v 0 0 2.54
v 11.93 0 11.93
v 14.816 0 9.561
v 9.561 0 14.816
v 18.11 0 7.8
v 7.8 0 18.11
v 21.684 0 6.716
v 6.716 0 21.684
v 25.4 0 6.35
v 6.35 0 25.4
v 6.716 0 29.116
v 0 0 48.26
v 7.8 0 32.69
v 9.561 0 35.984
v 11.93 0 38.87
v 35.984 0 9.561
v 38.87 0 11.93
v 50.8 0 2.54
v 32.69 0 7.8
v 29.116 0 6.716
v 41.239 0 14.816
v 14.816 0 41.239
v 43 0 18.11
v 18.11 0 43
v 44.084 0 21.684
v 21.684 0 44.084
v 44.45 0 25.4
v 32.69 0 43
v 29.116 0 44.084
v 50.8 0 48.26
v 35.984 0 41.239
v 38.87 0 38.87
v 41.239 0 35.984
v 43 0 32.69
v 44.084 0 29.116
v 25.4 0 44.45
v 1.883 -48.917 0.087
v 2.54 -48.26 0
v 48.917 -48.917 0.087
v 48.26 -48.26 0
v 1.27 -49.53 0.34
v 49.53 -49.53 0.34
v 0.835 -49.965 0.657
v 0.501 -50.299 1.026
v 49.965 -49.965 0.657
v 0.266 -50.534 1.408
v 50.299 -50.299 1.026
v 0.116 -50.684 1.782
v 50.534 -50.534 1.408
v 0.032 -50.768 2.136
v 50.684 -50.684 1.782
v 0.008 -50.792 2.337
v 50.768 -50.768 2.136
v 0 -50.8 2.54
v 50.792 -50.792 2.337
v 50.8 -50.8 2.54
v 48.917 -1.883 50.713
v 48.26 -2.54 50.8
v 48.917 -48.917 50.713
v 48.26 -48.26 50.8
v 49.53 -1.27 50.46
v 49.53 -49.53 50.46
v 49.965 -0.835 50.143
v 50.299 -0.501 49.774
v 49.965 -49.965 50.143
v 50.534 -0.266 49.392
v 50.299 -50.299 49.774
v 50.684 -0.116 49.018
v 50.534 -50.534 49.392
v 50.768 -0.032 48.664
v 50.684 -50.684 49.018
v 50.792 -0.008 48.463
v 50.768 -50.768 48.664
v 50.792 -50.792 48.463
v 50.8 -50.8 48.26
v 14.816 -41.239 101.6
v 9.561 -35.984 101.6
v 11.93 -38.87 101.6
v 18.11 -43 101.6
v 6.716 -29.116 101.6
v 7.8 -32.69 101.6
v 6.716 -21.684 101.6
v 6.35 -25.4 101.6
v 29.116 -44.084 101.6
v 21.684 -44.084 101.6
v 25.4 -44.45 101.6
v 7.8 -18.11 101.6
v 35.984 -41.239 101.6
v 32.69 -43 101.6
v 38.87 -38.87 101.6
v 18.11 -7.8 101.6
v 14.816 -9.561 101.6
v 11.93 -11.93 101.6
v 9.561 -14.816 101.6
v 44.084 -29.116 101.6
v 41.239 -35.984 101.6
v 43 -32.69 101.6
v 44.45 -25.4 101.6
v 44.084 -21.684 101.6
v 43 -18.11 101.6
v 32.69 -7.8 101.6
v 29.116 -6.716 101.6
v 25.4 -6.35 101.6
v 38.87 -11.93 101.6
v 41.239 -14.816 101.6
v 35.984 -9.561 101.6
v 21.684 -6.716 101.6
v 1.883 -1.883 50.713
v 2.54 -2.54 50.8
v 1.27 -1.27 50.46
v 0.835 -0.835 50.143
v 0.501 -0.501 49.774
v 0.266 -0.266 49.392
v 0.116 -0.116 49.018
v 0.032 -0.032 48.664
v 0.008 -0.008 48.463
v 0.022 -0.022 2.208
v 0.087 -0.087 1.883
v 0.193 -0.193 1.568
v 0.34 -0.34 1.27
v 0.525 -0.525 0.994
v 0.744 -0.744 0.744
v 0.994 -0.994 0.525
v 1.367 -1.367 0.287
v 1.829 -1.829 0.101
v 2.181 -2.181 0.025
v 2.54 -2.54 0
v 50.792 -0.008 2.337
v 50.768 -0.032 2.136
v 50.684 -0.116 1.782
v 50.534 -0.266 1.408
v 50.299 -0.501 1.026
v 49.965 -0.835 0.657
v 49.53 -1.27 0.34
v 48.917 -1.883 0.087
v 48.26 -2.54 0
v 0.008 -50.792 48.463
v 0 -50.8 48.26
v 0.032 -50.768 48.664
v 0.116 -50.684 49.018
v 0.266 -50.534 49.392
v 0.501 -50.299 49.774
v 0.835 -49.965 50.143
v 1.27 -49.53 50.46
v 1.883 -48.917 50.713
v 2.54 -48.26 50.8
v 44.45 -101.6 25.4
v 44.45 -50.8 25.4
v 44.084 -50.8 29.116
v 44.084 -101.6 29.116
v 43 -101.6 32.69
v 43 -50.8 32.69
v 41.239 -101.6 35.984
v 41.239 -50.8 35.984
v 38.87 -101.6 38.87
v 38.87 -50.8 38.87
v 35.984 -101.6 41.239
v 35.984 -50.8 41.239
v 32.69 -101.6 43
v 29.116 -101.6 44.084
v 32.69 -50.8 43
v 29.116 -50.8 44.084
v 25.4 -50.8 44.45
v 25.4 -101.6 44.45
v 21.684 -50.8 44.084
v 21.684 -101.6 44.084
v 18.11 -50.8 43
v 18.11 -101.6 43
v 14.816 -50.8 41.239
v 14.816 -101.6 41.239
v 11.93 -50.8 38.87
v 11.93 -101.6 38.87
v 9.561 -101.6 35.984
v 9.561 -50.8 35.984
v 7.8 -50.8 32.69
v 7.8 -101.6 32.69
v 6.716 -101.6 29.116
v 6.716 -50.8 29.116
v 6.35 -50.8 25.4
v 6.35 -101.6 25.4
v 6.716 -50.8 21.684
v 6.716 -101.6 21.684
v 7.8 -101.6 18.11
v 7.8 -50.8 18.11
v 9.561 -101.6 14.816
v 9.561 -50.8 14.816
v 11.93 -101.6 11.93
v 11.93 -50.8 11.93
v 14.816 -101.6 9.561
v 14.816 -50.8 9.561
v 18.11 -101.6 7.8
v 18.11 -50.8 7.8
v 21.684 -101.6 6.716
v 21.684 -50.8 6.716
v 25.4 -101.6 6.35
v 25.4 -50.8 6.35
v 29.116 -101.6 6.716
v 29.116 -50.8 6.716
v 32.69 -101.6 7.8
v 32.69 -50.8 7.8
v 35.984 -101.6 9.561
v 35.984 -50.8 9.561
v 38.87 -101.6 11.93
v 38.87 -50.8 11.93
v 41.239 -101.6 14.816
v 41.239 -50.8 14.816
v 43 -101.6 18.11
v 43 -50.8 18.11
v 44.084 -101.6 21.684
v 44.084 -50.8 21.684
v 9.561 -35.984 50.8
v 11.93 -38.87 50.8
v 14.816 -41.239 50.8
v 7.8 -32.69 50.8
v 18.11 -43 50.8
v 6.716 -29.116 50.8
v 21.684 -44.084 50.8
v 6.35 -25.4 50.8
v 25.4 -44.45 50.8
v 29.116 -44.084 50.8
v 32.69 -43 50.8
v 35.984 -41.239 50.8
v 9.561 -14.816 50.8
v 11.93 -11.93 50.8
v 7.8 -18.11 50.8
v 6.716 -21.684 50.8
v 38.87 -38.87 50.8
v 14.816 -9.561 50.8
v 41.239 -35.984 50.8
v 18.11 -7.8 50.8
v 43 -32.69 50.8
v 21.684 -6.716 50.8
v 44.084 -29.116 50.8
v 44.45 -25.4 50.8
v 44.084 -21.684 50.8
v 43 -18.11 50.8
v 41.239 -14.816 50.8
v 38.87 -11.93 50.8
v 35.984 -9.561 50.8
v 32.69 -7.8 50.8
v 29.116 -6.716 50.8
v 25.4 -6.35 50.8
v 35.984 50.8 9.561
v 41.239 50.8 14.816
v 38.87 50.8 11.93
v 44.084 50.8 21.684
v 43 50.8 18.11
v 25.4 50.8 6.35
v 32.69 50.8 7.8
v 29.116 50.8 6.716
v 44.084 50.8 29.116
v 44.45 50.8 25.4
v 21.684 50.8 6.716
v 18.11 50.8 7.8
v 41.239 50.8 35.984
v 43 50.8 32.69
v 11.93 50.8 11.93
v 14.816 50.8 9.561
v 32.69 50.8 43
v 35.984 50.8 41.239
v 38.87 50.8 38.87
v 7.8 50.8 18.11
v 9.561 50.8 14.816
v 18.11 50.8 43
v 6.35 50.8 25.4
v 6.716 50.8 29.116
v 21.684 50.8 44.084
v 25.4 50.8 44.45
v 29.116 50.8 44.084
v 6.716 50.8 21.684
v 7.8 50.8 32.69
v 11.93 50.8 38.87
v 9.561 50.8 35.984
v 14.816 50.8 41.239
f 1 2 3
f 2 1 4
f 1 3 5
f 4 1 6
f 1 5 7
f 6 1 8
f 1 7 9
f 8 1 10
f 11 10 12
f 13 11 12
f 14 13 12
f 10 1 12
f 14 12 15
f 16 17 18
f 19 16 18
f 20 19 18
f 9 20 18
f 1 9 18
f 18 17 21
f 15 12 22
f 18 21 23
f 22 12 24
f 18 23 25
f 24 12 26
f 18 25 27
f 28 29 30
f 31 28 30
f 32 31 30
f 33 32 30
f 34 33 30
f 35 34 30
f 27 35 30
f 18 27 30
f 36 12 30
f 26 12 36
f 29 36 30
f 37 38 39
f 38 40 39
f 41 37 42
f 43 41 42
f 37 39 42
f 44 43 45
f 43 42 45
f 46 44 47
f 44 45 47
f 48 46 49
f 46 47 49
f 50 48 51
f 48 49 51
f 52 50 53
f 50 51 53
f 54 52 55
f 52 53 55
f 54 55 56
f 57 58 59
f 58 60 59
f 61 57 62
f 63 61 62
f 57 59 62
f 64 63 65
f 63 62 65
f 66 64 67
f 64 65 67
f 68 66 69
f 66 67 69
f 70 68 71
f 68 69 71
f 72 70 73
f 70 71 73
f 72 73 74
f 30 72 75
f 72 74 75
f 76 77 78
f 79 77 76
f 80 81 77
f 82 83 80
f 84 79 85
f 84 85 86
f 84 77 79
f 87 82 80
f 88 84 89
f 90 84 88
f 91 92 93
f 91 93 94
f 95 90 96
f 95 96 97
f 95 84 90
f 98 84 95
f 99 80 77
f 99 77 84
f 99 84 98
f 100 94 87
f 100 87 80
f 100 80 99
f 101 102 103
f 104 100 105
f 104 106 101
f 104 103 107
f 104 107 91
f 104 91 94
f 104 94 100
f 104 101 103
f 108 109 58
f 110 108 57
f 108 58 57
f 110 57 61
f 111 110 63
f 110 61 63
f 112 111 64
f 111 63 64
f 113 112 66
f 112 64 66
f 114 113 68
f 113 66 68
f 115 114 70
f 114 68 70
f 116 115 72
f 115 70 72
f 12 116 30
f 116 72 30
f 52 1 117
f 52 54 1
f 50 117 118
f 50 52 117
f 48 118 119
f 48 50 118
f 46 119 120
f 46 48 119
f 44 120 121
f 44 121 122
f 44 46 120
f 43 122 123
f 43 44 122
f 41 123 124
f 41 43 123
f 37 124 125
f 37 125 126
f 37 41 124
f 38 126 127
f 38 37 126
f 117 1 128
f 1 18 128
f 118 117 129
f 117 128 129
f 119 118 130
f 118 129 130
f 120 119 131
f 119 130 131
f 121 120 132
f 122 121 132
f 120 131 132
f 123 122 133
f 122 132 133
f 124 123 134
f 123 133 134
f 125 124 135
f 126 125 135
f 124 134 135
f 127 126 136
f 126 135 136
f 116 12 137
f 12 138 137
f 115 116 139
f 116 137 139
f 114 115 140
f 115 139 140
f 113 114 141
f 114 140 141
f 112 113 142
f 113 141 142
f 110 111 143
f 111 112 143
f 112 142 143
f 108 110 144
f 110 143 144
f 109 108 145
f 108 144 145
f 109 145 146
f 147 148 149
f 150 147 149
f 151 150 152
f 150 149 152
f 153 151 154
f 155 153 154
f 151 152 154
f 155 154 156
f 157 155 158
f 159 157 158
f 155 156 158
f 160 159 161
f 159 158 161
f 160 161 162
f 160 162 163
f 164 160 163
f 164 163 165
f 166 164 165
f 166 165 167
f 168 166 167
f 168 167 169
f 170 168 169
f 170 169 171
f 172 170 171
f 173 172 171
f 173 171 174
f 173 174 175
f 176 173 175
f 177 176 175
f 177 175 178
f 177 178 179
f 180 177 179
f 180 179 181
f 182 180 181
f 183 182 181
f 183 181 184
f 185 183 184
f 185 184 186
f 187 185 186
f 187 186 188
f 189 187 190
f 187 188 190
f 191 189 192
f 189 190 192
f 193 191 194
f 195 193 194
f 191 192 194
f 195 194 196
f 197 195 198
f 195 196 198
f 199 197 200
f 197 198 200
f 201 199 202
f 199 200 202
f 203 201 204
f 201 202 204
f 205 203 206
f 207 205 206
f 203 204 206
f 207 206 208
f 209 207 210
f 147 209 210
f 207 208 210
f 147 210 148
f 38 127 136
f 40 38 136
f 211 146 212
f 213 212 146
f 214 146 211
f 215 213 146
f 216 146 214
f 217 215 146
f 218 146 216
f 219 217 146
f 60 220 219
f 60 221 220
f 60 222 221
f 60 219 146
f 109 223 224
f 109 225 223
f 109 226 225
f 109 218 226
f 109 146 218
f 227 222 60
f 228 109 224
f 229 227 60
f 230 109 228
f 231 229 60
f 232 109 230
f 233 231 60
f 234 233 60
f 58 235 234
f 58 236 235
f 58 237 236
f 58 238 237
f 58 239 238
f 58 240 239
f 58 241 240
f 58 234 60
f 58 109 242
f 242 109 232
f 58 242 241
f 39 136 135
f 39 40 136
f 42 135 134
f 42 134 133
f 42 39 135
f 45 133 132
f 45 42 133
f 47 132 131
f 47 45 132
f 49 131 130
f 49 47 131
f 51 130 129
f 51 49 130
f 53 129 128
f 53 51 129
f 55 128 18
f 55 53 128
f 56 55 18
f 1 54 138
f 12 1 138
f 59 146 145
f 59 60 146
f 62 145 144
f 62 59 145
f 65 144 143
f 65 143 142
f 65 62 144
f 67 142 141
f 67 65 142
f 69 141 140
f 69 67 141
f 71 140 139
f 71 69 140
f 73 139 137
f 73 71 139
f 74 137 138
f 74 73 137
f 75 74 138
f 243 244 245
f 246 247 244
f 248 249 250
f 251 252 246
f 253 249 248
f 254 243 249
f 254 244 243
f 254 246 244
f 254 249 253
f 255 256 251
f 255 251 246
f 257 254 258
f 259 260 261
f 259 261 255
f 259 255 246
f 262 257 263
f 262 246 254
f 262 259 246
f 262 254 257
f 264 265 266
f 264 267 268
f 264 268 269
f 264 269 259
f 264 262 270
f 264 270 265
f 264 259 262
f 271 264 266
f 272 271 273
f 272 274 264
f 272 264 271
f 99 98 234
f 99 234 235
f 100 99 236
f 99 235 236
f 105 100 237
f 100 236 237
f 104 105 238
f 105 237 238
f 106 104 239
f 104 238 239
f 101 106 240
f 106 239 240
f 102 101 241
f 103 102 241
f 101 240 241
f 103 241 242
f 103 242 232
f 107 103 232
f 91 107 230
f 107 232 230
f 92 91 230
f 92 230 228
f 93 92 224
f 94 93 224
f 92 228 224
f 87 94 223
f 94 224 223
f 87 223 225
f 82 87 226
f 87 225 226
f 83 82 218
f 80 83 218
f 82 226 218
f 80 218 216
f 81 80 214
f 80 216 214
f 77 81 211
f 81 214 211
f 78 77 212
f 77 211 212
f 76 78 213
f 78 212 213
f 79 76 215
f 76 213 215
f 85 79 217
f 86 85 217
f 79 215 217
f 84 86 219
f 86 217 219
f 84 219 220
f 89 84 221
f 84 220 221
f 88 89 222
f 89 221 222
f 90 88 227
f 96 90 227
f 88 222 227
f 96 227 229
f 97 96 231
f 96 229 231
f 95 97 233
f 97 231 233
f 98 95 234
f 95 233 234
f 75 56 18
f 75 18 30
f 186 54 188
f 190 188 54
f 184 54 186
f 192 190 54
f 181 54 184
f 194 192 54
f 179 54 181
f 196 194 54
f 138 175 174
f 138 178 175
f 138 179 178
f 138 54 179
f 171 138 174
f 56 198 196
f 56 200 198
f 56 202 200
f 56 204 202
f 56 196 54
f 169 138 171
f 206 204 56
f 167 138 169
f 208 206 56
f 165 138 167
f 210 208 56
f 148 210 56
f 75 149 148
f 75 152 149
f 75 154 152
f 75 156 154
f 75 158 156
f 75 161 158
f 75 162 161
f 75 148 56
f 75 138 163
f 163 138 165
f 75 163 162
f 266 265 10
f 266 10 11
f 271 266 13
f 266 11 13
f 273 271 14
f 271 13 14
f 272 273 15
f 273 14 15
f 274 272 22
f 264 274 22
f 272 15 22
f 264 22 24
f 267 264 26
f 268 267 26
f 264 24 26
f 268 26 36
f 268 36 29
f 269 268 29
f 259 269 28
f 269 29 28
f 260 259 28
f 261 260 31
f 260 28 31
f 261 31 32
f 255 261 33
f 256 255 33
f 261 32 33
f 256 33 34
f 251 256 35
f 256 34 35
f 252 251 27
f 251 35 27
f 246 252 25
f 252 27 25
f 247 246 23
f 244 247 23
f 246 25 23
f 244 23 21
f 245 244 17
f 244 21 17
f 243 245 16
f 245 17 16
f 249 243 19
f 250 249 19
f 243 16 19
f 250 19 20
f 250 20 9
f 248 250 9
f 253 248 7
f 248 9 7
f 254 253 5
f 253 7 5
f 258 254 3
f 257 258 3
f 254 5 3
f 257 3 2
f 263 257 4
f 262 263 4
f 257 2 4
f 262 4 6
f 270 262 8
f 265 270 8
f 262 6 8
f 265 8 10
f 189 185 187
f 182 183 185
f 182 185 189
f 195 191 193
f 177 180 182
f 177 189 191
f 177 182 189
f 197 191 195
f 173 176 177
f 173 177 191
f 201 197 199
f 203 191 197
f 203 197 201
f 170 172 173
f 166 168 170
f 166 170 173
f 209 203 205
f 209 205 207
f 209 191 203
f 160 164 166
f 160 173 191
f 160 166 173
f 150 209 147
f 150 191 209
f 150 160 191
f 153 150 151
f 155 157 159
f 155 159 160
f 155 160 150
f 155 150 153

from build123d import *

# Parameters (mm, degrees)
F0_R     = 19.05
F1_DEPTH = 101.6
F0_W     = 50.8
F0_H     = 50.8
F2_DEPTH = 50.8
F3_R     = 19.05
F4_DEPTH = 50.8
F5_R     = 19.05
F6_DEPTH = 50.8
F7_R     = 2.54
F8_R     = 2.54


with BuildPart() as f1:
    # F0 (on Front) → F1 (new body)
    with BuildSketch(Plane.XZ):
        with Locations((25.4, 25.4)):
            Circle(F0_R)
    extrude(amount=F1_DEPTH)

    # F0 (on Front) → F2 (join)
    with BuildSketch(Plane.XZ):
        with Locations((25.4, 25.4)):
            Rectangle(F0_W, F0_H)
        with Locations((25.4, 25.4)):
            Circle(F0_R, mode=Mode.SUBTRACT)
    extrude(amount=F2_DEPTH)

    # F3 (on face) → F4 (join)
    with BuildSketch(Plane.XY.offset(50.8)):
        with Locations((25.4, -25.4)):
            Circle(F3_R)
    extrude(amount=F4_DEPTH)

    # F5 (on face) → F6 (join)
    with BuildSketch(Plane(origin=(0, 0, 0), x_dir=(-1, 0, 0), z_dir=(0, 1, 0))):
        with Locations((-25.4, 25.4)):
            Circle(F5_R)
    extrude(amount=F6_DEPTH)

    # F7
    f7_edges = [f1.edges().sort_by_distance(p)[0] for p in [
        (25.4, -50.8, 50.8),
        (50.8, -25.4, 50.8),
        (25.4, 0, 50.8),
        (0, -25.4, 50.8),
    ]]
    fillet(f7_edges, radius=F7_R)

    # F8
    f8_edges = [f1.edges().sort_by_distance(p)[0] for p in [
        (50.8, -25.4, 0),
        (25.4, -50.8, 0),
        (25.4, 0, 0),
        (0, -25.4, 0),
    ]]
    fillet(f8_edges, radius=F8_R)


solid = f1.part
